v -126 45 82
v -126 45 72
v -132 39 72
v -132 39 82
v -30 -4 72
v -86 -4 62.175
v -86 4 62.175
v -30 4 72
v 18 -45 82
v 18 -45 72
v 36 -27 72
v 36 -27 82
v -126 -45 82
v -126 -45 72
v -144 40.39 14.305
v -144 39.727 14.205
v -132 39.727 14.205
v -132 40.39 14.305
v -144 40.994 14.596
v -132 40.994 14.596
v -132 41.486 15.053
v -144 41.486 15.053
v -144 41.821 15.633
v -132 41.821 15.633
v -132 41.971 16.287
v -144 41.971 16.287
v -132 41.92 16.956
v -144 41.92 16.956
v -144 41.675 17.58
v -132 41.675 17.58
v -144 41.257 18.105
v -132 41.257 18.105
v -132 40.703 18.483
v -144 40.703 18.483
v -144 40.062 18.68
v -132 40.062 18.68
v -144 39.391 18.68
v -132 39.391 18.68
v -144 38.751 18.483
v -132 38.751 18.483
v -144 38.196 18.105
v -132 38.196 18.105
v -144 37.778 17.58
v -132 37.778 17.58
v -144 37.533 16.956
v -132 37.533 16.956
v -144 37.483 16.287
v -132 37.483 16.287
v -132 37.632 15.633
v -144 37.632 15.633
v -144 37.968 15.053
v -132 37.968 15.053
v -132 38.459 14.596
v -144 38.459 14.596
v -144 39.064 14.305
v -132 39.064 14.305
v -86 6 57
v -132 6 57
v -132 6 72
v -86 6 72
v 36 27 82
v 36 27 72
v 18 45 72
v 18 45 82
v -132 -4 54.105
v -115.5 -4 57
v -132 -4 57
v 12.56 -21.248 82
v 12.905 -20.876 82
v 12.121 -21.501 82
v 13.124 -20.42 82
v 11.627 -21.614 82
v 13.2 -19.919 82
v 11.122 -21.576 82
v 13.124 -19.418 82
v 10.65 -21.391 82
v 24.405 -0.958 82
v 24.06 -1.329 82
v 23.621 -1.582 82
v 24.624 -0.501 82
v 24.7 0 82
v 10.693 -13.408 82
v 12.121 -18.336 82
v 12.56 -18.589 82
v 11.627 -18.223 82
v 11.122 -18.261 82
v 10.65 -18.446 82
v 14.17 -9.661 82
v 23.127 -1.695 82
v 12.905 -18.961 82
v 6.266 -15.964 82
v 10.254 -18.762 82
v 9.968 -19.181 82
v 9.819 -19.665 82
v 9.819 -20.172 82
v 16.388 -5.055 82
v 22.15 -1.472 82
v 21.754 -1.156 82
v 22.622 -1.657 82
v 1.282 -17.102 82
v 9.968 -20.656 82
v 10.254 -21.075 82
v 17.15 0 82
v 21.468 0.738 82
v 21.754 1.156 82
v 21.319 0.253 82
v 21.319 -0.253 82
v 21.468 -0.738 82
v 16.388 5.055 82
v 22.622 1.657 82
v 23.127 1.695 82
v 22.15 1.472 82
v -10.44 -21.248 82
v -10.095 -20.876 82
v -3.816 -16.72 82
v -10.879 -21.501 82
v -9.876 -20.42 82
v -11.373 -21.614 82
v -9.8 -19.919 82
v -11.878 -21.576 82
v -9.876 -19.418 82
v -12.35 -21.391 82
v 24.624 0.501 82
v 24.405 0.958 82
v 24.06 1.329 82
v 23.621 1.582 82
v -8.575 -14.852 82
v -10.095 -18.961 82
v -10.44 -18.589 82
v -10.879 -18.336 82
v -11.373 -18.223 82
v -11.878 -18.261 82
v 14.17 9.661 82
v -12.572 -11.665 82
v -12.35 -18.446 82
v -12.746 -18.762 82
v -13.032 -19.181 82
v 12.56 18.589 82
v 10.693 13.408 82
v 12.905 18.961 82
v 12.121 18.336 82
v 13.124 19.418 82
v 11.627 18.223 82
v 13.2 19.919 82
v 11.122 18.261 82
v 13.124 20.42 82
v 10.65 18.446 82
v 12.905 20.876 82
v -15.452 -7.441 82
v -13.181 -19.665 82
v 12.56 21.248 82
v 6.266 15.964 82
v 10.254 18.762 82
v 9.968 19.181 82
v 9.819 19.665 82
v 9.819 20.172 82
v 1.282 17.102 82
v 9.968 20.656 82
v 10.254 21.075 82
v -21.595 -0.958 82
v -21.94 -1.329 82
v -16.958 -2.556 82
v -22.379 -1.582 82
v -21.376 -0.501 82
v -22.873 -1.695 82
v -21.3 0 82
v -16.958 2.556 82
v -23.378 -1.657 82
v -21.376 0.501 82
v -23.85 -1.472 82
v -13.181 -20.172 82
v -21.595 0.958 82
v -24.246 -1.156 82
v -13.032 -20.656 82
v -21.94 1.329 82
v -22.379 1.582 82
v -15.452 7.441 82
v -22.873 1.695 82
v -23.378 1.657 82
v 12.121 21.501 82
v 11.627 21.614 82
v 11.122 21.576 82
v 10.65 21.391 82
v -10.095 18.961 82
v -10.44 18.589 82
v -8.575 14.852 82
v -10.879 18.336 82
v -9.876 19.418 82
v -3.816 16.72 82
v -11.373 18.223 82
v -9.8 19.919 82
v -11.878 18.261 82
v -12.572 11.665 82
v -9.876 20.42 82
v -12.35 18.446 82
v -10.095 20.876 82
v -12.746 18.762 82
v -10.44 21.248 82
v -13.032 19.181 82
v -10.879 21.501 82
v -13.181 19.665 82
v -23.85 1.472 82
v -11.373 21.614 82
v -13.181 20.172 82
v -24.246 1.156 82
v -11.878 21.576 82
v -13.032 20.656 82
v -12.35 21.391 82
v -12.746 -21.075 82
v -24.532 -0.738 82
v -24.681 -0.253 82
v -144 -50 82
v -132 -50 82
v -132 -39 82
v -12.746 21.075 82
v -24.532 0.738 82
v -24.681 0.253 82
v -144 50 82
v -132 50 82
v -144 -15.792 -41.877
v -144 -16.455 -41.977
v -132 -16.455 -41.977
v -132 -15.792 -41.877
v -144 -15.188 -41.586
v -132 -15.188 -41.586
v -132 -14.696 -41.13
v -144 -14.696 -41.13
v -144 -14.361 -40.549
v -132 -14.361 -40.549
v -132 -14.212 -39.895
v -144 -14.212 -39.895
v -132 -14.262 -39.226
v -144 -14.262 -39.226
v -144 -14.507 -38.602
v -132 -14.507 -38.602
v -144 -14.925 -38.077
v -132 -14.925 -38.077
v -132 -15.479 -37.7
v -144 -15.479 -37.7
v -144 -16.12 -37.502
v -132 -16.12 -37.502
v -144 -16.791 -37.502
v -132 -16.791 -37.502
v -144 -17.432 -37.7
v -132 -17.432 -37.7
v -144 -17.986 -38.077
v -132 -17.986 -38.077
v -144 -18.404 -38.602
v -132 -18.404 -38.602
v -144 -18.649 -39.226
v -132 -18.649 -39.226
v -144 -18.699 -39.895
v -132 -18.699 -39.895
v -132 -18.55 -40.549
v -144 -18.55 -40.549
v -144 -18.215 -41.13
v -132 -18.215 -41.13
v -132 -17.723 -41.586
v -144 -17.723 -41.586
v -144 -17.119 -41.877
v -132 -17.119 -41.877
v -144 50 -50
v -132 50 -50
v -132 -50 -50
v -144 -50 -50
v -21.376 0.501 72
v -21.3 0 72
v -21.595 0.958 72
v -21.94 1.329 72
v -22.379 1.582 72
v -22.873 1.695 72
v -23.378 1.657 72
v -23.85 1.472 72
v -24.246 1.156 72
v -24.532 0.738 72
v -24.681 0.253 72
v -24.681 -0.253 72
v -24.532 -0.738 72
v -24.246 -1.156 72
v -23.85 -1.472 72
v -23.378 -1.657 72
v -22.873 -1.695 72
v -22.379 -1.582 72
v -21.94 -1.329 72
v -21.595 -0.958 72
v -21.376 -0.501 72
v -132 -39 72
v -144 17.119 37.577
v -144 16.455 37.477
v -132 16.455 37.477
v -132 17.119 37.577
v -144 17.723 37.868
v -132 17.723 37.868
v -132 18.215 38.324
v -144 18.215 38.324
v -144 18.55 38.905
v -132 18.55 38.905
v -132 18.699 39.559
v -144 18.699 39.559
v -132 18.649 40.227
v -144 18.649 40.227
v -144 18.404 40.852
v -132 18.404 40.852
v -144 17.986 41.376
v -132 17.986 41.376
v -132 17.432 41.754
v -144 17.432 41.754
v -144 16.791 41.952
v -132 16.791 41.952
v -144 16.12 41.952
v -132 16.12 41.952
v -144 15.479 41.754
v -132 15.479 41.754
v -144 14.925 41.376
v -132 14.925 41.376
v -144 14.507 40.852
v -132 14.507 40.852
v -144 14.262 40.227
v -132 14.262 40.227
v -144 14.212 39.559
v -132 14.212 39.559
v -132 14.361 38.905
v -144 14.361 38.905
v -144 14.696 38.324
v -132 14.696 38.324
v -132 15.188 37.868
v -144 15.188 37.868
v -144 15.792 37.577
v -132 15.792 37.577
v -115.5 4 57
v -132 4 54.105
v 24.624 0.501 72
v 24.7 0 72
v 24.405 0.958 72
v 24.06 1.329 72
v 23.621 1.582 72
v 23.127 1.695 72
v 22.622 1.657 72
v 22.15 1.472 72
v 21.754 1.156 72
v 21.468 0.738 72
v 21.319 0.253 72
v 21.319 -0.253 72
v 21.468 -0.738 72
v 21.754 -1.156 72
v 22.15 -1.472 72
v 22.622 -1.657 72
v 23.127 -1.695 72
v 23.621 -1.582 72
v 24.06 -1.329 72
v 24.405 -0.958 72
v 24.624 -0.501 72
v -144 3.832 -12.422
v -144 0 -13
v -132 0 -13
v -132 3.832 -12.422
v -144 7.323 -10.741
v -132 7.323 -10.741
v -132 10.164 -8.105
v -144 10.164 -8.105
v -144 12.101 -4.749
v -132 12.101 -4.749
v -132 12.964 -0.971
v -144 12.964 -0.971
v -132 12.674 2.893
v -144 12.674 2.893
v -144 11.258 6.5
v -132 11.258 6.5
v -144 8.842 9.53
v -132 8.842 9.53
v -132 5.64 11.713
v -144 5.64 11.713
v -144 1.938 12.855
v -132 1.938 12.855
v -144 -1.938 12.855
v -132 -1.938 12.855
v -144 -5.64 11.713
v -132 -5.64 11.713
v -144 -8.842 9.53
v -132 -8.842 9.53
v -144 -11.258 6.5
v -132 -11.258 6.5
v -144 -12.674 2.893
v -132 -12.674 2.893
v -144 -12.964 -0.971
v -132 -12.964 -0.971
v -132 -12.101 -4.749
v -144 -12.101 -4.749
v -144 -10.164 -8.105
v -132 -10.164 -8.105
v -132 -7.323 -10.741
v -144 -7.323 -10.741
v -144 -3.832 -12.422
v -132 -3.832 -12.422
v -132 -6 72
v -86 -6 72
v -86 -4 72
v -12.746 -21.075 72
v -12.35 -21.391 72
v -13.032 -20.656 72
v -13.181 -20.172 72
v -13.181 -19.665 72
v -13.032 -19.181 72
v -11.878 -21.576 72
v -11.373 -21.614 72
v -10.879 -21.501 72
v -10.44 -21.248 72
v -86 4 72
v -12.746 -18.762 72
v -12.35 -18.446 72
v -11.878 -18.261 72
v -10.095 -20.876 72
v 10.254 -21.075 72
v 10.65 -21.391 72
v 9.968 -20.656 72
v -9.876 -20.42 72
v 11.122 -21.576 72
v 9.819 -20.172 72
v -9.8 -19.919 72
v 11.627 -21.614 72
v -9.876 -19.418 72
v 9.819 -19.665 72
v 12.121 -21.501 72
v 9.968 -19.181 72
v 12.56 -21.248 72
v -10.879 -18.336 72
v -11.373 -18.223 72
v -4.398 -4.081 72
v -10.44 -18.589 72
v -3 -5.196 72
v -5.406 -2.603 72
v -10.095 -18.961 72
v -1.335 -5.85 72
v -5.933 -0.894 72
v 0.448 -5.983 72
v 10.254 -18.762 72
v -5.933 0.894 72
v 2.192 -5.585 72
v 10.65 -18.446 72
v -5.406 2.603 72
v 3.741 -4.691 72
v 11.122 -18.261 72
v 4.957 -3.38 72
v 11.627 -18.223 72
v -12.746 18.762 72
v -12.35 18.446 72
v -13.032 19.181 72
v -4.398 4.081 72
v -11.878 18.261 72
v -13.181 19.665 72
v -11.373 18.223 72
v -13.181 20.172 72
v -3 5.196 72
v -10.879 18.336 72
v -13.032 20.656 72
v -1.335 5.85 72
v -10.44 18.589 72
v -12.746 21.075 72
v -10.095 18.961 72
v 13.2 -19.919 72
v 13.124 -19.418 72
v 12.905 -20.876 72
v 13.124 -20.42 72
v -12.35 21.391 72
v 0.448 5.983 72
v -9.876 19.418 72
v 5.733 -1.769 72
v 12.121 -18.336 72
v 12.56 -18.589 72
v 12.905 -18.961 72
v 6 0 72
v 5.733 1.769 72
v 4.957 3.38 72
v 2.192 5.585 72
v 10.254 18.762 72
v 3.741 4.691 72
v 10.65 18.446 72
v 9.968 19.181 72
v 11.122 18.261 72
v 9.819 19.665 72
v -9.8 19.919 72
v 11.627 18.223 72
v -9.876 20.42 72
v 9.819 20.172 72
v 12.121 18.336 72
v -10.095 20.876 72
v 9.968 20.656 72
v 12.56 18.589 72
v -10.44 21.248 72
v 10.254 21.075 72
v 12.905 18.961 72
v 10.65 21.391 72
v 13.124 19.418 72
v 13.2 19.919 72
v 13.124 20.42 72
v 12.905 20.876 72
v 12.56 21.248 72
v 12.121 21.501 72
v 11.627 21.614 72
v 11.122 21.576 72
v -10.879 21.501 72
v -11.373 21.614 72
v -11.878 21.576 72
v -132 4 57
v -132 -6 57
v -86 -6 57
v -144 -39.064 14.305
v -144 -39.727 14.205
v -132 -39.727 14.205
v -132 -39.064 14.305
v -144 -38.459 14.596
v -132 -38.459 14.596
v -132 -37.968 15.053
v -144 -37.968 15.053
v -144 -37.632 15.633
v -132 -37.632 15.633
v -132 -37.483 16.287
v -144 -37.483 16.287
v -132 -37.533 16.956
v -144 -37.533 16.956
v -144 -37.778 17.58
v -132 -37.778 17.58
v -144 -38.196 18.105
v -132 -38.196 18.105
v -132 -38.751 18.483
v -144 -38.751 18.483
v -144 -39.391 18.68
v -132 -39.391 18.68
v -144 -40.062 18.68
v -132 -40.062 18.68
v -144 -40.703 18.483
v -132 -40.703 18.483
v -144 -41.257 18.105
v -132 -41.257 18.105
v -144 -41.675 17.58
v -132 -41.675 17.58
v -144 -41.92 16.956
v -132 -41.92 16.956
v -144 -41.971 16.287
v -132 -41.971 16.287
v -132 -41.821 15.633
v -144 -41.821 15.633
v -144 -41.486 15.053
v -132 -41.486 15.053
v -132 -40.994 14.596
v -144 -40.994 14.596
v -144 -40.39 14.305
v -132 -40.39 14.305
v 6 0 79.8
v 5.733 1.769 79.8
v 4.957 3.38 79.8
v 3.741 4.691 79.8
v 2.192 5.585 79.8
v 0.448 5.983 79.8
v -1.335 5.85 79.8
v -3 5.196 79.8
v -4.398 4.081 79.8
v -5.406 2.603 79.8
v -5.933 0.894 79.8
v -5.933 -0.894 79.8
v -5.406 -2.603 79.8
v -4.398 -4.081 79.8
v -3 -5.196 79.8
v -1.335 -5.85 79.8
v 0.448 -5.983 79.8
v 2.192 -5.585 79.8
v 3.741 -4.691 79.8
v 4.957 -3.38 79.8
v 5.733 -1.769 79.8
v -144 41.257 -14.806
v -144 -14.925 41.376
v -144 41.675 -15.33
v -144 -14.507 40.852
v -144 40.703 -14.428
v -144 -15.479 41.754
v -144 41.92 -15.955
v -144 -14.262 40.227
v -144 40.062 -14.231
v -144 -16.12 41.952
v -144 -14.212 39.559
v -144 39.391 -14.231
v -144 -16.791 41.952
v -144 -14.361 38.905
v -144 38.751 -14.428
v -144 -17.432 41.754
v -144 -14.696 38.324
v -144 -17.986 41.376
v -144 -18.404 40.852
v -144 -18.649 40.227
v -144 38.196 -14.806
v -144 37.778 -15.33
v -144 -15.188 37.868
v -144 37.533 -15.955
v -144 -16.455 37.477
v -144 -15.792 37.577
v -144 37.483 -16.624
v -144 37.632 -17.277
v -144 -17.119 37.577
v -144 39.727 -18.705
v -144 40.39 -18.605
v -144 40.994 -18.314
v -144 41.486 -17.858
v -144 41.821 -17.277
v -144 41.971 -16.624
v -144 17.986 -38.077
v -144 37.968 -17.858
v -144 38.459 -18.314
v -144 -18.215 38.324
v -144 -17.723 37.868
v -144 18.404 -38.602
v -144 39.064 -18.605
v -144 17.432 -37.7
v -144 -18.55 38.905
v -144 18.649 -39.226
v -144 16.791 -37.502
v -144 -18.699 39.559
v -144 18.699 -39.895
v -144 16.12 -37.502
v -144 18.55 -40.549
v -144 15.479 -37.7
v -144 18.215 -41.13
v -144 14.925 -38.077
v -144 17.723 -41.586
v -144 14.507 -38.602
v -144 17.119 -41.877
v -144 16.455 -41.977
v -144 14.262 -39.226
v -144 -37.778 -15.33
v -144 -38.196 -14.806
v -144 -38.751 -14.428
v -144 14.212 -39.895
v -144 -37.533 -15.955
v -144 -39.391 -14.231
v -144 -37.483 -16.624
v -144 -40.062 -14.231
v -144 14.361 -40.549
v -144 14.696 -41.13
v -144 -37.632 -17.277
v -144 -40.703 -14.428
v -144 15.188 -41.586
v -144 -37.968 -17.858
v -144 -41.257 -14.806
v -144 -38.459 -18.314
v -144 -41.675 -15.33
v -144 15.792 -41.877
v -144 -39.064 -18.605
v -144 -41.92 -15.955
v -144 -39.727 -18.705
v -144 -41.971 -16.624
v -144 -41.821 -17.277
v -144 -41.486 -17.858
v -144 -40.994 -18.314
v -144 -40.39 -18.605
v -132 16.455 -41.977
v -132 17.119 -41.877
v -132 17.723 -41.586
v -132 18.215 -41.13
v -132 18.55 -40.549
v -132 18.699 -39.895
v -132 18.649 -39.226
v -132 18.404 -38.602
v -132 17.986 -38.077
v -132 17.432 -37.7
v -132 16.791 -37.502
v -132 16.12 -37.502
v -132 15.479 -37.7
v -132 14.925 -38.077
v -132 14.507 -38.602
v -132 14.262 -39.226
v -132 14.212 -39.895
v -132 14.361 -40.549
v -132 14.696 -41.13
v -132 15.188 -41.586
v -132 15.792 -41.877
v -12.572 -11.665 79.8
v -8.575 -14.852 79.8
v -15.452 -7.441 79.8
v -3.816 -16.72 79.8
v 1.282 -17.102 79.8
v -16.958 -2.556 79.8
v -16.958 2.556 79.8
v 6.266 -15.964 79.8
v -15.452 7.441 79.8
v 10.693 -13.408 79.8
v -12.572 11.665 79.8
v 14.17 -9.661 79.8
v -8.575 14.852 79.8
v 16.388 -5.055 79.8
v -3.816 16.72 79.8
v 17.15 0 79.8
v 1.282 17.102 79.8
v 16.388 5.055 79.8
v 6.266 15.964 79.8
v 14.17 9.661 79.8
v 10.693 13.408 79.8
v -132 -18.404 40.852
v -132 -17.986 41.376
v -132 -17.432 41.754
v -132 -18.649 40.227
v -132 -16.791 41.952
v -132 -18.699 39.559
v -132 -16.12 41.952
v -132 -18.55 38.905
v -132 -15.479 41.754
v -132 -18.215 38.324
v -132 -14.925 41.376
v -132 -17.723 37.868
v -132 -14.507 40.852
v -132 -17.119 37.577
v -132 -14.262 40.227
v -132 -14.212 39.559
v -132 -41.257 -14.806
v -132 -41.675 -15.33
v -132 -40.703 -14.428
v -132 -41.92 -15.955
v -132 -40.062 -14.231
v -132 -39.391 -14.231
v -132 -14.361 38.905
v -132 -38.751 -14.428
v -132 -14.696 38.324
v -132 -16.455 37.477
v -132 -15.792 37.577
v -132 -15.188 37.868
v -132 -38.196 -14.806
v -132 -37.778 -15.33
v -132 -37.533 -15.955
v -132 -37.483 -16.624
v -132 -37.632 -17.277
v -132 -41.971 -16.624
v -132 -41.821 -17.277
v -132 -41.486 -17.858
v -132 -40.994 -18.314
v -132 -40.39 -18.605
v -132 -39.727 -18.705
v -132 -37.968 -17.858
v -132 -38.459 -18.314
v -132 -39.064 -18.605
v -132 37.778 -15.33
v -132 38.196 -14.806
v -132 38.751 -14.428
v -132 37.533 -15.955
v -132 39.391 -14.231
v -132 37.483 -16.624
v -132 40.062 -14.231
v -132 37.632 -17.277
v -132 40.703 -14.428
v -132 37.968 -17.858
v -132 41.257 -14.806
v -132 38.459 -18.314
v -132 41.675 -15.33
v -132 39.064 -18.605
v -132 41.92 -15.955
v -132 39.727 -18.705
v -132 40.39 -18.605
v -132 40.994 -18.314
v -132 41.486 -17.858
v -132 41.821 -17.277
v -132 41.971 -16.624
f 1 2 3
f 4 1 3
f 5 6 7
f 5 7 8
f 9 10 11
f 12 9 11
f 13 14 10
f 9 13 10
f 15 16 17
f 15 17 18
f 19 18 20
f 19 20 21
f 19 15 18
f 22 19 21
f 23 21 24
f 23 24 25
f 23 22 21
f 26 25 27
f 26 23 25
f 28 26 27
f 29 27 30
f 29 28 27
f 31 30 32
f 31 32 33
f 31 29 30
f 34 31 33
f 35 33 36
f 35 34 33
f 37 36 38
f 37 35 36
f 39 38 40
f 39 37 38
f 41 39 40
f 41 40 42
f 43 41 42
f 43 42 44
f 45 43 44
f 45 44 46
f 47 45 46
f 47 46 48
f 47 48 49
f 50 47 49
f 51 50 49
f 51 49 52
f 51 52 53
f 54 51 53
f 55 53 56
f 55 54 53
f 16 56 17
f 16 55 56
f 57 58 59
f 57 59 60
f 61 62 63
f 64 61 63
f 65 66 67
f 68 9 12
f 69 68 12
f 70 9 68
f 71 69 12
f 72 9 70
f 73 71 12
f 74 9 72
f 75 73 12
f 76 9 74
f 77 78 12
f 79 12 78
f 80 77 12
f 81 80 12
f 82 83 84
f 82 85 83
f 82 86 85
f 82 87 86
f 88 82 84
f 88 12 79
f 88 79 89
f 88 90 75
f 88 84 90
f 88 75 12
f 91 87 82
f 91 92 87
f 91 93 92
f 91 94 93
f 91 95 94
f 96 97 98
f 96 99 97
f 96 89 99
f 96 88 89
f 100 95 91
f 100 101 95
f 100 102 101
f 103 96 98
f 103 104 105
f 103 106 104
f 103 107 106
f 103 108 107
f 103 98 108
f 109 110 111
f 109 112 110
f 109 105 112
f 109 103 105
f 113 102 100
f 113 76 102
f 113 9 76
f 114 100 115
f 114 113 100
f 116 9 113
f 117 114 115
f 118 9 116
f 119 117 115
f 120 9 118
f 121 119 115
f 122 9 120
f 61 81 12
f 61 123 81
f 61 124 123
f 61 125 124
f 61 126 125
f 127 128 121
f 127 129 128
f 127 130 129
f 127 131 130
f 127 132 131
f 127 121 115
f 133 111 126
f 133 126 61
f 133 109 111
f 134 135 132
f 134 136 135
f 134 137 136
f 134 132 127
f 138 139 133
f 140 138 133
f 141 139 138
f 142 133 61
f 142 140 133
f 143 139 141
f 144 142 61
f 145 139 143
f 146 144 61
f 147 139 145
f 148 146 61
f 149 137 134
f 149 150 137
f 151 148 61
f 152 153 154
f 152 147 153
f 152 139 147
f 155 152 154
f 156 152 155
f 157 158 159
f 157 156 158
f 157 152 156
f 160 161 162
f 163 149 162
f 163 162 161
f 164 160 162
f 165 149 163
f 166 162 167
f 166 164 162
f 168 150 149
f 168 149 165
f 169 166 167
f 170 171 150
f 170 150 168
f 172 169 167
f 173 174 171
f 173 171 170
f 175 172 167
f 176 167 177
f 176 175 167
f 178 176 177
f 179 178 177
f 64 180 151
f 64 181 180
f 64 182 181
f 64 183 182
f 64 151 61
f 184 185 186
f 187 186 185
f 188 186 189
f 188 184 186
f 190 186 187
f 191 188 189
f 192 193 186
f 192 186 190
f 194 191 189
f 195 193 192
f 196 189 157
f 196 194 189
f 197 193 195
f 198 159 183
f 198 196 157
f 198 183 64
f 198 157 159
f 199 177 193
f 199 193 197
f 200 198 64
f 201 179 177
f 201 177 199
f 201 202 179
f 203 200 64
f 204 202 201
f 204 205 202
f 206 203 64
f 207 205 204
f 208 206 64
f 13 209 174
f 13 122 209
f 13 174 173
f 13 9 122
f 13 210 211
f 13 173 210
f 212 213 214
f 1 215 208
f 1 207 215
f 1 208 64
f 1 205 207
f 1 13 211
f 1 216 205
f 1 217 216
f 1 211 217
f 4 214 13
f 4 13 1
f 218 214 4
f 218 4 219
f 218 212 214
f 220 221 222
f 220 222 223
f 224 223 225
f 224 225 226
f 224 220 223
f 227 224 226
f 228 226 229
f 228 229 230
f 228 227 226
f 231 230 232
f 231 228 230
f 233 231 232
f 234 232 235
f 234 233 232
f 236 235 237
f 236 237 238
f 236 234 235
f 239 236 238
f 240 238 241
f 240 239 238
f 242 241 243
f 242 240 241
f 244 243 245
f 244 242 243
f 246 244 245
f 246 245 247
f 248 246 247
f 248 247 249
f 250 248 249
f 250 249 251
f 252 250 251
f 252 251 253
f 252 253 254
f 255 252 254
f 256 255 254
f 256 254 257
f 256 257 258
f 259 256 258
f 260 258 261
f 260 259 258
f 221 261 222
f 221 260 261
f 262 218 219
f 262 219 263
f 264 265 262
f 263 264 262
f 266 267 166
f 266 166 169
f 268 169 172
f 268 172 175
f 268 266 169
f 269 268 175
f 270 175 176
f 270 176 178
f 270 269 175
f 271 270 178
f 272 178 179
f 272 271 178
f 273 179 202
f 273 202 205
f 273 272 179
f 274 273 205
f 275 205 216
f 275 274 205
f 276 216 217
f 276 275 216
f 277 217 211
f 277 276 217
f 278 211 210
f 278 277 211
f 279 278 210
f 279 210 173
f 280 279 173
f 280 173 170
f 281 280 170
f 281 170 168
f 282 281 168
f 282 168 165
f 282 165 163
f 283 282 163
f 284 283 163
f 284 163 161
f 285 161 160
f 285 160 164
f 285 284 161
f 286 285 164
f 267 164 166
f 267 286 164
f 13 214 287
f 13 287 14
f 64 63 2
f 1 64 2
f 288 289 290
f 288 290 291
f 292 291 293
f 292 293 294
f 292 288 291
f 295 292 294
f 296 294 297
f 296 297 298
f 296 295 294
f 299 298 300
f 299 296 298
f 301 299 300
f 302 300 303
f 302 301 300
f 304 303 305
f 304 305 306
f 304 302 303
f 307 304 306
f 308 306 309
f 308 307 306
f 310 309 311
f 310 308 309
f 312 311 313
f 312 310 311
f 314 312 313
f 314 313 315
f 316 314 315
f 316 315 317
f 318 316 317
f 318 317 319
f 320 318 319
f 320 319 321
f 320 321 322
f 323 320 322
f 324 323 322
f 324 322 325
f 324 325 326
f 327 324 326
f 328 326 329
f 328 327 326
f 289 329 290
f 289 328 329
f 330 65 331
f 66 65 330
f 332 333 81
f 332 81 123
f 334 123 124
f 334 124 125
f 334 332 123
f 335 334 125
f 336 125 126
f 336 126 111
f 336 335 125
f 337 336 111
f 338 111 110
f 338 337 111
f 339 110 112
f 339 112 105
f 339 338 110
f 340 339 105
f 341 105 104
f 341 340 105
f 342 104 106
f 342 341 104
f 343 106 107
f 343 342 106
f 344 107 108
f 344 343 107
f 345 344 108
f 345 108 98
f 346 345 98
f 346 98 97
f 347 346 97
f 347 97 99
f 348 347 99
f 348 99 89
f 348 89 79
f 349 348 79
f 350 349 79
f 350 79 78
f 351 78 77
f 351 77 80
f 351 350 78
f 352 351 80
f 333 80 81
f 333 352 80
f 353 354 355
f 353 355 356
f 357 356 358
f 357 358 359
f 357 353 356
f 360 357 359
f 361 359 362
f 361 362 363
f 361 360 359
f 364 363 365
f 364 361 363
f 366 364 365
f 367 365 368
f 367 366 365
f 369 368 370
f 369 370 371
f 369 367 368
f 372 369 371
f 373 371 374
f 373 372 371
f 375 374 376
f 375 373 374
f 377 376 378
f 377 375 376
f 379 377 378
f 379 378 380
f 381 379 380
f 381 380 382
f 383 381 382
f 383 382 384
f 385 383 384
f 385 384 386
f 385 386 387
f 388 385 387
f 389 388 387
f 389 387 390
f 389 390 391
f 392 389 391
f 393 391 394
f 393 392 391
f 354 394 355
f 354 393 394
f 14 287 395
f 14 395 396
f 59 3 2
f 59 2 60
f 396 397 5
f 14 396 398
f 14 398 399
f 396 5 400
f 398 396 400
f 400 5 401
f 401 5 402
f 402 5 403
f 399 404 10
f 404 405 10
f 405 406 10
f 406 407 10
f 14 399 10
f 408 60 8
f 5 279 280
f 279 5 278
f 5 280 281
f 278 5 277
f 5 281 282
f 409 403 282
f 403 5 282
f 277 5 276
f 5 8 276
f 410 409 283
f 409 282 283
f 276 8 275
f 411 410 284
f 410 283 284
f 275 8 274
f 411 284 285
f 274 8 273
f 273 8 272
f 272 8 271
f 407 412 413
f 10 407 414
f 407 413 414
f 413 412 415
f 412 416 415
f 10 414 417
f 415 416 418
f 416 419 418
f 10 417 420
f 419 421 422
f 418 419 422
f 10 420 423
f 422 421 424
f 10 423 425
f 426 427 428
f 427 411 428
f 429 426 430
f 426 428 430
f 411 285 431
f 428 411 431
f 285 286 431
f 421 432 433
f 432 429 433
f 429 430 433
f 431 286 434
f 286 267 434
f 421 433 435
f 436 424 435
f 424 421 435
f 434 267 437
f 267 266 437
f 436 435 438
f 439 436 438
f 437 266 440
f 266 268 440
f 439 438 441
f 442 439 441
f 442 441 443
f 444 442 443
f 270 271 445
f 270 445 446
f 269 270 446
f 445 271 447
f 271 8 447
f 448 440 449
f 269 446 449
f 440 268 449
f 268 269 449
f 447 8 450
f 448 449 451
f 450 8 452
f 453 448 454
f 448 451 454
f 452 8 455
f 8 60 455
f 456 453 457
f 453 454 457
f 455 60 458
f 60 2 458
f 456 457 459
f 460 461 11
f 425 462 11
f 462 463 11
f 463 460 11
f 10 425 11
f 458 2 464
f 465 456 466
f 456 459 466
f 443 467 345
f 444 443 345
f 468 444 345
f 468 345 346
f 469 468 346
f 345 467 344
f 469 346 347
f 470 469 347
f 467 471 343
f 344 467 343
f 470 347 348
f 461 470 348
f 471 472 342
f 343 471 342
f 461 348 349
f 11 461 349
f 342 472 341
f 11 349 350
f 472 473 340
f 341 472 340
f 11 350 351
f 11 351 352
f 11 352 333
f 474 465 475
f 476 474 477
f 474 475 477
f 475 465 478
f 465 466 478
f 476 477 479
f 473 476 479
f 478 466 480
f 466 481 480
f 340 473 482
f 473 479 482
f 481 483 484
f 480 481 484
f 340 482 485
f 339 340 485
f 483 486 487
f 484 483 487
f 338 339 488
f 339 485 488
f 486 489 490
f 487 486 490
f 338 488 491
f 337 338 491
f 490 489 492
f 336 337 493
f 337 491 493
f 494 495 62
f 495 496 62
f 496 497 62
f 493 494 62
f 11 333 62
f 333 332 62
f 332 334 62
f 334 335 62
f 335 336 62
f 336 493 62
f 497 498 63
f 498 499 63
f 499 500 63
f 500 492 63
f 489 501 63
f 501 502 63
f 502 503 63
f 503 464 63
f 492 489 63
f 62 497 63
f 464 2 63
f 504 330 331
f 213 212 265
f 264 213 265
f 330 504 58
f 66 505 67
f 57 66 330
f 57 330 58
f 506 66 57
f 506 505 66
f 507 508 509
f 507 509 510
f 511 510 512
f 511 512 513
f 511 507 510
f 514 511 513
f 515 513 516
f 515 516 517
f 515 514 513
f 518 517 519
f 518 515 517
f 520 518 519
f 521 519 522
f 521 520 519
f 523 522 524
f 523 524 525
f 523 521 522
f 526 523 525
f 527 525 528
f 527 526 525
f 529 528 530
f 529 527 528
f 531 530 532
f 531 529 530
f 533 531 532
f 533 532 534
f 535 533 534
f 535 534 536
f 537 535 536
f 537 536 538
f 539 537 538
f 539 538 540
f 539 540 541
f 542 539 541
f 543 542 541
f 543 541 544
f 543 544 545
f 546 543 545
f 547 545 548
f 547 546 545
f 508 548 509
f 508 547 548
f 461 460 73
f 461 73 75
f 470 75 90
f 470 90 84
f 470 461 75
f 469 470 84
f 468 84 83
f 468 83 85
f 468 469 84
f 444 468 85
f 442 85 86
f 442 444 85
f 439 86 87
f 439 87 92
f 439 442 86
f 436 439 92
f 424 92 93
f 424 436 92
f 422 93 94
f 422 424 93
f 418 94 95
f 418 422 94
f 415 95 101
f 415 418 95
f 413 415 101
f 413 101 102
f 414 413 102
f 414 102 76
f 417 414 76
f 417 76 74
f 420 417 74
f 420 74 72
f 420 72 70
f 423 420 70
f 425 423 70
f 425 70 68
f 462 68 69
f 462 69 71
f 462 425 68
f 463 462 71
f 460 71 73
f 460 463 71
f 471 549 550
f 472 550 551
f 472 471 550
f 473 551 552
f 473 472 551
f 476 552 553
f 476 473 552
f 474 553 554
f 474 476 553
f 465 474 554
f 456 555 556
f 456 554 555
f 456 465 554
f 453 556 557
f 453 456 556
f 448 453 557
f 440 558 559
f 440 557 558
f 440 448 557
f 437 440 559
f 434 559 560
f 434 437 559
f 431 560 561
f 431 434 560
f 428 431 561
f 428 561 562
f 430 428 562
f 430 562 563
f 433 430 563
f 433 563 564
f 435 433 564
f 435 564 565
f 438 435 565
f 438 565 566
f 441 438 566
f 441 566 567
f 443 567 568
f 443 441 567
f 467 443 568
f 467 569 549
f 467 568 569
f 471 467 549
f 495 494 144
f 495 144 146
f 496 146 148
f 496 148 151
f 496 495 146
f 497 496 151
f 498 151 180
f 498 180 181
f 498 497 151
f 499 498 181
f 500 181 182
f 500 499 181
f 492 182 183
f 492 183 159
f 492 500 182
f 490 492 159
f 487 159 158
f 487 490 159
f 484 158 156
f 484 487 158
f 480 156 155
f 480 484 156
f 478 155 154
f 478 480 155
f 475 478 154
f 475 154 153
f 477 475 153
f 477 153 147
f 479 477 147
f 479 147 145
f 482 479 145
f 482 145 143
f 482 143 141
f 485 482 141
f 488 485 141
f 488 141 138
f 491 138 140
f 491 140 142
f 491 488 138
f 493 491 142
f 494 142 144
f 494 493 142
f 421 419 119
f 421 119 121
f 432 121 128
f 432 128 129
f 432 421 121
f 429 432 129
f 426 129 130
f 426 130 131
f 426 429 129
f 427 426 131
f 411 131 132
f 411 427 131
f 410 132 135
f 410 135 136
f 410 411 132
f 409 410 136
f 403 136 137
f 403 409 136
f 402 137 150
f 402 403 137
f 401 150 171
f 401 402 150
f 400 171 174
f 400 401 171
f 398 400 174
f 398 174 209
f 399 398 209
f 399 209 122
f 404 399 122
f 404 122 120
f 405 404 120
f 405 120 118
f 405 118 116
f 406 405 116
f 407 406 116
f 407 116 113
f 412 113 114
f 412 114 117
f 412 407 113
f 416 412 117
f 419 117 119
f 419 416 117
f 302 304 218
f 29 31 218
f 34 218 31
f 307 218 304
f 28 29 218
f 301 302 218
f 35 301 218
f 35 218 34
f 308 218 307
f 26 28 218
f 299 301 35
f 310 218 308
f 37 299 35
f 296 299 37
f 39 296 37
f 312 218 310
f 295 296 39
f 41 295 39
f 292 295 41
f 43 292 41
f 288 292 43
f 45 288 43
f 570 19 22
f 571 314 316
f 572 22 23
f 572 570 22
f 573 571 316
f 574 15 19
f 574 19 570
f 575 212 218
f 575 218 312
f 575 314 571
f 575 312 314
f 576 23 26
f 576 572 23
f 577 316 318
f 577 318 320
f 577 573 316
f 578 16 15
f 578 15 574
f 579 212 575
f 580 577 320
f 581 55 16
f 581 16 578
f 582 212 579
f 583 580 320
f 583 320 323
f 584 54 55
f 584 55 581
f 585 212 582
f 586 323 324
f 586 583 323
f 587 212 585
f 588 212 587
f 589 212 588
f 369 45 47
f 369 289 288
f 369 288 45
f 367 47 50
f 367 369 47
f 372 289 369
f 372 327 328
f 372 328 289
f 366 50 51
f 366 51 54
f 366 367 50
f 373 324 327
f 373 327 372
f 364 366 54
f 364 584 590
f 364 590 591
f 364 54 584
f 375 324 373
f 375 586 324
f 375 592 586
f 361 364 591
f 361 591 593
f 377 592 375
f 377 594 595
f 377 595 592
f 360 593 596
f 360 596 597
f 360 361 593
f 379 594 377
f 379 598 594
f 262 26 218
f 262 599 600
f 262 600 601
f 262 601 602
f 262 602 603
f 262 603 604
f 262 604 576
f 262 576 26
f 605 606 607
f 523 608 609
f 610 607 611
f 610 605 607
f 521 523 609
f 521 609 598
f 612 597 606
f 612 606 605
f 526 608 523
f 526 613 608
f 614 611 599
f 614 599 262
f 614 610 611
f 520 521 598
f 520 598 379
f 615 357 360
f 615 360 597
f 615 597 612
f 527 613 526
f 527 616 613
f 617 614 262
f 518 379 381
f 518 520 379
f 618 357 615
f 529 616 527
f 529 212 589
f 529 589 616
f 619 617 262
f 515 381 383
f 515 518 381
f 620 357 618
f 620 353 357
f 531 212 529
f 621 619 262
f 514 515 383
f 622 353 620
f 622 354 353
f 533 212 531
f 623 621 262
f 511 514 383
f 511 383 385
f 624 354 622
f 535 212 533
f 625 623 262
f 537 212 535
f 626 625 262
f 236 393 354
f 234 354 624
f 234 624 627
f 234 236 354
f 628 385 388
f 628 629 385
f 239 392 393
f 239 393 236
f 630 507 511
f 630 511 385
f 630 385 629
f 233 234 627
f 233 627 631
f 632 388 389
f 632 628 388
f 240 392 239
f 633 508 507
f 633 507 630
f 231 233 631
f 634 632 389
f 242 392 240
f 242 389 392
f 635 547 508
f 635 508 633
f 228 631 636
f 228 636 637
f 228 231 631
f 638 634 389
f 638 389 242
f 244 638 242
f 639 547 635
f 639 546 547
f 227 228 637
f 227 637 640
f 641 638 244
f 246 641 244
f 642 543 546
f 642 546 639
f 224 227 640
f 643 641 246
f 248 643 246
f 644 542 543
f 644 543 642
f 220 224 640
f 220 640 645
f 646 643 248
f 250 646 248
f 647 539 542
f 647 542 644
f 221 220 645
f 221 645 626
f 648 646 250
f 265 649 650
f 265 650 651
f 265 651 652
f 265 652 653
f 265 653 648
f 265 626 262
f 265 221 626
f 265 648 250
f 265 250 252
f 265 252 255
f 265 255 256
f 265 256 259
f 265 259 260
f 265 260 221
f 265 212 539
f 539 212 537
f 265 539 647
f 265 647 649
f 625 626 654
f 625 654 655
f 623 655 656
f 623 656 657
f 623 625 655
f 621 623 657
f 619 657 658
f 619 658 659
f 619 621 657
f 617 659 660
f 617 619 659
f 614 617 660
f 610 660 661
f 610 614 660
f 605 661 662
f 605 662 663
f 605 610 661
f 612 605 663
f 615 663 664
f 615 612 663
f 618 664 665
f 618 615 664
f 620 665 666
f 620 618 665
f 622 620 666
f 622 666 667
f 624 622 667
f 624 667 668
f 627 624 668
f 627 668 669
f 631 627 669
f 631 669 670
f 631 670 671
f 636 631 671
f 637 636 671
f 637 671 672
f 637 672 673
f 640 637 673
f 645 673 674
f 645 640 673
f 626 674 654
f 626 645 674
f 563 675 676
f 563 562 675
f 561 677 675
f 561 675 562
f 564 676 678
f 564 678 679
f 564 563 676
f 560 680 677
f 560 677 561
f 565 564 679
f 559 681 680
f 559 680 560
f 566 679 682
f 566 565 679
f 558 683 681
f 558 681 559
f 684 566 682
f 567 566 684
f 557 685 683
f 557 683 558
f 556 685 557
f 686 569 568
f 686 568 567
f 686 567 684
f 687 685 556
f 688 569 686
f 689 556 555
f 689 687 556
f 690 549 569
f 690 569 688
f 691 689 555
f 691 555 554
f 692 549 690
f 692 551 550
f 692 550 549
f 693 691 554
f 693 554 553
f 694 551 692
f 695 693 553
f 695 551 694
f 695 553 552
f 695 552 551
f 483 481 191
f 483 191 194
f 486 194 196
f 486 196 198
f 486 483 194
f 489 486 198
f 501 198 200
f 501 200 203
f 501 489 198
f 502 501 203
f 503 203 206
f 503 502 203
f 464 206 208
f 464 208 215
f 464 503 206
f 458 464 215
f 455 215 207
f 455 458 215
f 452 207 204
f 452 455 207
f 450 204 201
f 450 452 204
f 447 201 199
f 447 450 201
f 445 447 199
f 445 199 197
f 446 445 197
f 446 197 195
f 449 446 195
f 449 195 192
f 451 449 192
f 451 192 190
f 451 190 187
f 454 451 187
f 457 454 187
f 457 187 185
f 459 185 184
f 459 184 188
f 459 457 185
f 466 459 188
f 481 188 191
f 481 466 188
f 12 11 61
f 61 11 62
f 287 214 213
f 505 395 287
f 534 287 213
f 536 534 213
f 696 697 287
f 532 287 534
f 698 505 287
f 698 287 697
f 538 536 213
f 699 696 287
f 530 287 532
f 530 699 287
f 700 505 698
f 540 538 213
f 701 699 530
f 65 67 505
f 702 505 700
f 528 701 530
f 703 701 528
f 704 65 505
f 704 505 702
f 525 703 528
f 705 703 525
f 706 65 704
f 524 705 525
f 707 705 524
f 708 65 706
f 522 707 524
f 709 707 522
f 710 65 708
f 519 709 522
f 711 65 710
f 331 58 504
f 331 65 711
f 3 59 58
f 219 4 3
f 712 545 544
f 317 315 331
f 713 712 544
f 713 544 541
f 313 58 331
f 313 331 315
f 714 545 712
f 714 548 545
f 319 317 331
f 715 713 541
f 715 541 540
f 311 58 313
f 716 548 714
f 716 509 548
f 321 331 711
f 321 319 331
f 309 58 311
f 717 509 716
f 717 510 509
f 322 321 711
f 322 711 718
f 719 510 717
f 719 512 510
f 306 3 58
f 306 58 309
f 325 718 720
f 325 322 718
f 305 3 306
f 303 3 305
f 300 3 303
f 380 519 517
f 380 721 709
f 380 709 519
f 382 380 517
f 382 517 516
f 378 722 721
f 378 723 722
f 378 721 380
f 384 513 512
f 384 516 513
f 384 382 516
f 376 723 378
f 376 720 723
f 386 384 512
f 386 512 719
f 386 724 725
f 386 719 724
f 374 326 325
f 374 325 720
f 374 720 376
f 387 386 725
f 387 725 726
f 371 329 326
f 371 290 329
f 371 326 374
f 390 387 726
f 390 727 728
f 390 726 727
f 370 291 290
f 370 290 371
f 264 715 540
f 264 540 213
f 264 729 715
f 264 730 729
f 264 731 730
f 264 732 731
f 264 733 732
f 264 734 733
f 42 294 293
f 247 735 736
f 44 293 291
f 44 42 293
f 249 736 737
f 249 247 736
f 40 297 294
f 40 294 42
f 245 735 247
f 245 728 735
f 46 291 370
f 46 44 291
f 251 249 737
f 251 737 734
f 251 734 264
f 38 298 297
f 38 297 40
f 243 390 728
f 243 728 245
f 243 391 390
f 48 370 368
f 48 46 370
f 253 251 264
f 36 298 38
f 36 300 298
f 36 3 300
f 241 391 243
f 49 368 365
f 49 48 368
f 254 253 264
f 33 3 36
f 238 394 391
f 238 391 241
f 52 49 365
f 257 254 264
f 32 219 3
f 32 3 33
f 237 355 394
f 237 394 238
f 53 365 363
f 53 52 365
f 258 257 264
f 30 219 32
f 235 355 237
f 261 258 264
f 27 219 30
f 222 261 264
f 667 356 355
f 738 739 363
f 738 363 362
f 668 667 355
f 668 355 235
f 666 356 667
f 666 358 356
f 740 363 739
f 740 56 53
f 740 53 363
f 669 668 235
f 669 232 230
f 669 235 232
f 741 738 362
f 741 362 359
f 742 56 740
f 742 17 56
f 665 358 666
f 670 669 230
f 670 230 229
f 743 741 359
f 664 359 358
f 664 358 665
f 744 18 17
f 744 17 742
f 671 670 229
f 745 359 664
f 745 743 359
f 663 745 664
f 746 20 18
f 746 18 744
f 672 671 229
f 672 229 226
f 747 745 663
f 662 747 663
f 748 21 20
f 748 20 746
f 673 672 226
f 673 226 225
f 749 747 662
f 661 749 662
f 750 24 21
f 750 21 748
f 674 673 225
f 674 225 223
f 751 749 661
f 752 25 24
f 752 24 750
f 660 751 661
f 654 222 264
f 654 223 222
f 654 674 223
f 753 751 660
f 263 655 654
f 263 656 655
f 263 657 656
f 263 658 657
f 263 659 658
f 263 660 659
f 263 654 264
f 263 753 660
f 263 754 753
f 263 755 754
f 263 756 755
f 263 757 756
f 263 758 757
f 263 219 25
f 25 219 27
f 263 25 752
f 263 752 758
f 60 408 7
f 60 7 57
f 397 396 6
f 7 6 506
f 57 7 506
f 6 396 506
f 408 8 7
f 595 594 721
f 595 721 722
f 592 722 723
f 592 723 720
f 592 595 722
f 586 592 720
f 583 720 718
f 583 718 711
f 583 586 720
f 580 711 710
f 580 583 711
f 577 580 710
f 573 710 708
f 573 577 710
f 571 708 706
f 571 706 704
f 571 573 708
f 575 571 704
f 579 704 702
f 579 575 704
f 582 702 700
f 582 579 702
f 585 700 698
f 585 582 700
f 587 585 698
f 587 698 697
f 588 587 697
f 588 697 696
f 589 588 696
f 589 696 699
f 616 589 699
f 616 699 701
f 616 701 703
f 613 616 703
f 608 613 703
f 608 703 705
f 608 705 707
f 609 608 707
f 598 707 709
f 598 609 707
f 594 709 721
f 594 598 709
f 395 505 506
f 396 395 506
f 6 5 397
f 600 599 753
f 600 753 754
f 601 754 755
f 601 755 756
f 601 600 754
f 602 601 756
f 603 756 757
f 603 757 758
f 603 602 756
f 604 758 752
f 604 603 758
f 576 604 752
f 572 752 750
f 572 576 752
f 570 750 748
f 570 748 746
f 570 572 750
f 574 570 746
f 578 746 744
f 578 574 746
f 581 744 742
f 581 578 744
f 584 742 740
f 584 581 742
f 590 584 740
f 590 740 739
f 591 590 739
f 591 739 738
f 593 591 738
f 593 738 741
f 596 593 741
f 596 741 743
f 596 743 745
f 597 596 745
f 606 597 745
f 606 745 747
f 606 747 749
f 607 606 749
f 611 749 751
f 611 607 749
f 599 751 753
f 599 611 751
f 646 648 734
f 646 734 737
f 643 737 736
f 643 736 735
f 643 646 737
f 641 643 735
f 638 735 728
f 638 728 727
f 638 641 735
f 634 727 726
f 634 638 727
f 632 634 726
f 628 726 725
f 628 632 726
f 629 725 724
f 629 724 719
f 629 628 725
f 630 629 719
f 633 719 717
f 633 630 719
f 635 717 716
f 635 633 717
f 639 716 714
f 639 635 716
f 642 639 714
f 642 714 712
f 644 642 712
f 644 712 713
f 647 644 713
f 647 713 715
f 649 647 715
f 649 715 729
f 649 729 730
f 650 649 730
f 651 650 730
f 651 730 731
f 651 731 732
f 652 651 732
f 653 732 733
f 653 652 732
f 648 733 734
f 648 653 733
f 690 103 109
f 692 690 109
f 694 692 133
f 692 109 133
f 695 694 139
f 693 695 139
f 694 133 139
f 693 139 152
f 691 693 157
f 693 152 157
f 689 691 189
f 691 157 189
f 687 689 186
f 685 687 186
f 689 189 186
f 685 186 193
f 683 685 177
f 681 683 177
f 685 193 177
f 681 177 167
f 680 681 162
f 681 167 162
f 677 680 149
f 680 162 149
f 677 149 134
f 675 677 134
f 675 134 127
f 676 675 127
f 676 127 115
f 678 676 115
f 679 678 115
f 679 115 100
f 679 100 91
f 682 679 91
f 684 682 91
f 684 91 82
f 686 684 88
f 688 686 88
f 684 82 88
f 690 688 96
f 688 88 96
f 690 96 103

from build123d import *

# Parameters (mm, degrees)
SK_TOP_PLATE_R         = 1.7
SK_TOP_PLATE_R_2       = 6
TOP_PLATE_DEPTH        = 10
SK_YAW_PILOT_RECESS_R  = 17.15
YAW_PILOT_RECESS_DEPTH = 2.2
SK_BACK_PLATE_W        = 132
SK_BACK_PLATE_H        = 100
SK_BACK_PLATE_R        = 2.25
SK_BACK_PLATE_R_2      = 13
BACK_PLATE_DEPTH       = 12
RIB_DEPTH              = 8
SK_KEEL_W              = 58
SK_KEEL_H              = 15
KEEL_DEPTH             = 12


with BuildPart() as part:
    # SK_Top_Plate → Top_Plate (new body)
    with BuildSketch(Plane.XY.offset(72)):
        Polygon((-126, -45), (18, -45), (36, -27), (36, 27), (18, 45), (-126, 45), (-144, 27), (-144, -27), align=None)
        with Locations((23, 0)):
            Circle(SK_TOP_PLATE_R, mode=Mode.SUBTRACT)
        with Locations((11.5, 19.918584287)):
            Circle(SK_TOP_PLATE_R, mode=Mode.SUBTRACT)
        with Locations((-11.5, 19.918584287)):
            Circle(SK_TOP_PLATE_R, mode=Mode.SUBTRACT)
        with Locations((-23, 0)):
            Circle(SK_TOP_PLATE_R, mode=Mode.SUBTRACT)
        with Locations((-11.5, -19.918584287)):
            Circle(SK_TOP_PLATE_R, mode=Mode.SUBTRACT)
        with Locations((11.5, -19.918584287)):
            Circle(SK_TOP_PLATE_R, mode=Mode.SUBTRACT)
        Circle(SK_TOP_PLATE_R_2, mode=Mode.SUBTRACT)
    extrude(amount=TOP_PLATE_DEPTH)

    # SK_Yaw_Pilot_Recess → Yaw_Pilot_Recess (cut)
    with BuildSketch(Plane.XY.offset(82)):
        Circle(SK_YAW_PILOT_RECESS_R)
    extrude(amount=-YAW_PILOT_RECESS_DEPTH, mode=Mode.SUBTRACT)

    # SK_Back_Plate → Back_Plate (add)
    with BuildSketch(Plane(origin=(-144, 0, 0), x_dir=(0, 0, -1), z_dir=(1, 0, 0))):
        with Locations((-16, 0)):
            Rectangle(SK_BACK_PLATE_W, SK_BACK_PLATE_H)
        with Locations((39.726819898, 16.455387592)):
            Circle(SK_BACK_PLATE_R, mode=Mode.SUBTRACT)
        with Locations((16.455387592, 39.726819898)):
            Circle(SK_BACK_PLATE_R, mode=Mode.SUBTRACT)
        with Locations((-16.455387592, 39.726819898)):
            Circle(SK_BACK_PLATE_R, mode=Mode.SUBTRACT)
        with Locations((-39.726819898, 16.455387592)):
            Circle(SK_BACK_PLATE_R, mode=Mode.SUBTRACT)
        with Locations((-39.726819898, -16.455387592)):
            Circle(SK_BACK_PLATE_R, mode=Mode.SUBTRACT)
        with Locations((-16.455387592, -39.726819898)):
            Circle(SK_BACK_PLATE_R, mode=Mode.SUBTRACT)
        with Locations((16.455387592, -39.726819898)):
            Circle(SK_BACK_PLATE_R, mode=Mode.SUBTRACT)
        with Locations((39.726819898, -16.455387592)):
            Circle(SK_BACK_PLATE_R, mode=Mode.SUBTRACT)
        Circle(SK_BACK_PLATE_R_2, mode=Mode.SUBTRACT)
    extrude(amount=BACK_PLATE_DEPTH)

    # SK_Rib → Rib (add)
    with BuildSketch(Plane(origin=(0, -4, 0), x_dir=(1, 0, 0), z_dir=(0, 1, 0))):
        Polygon((-144, -52), (-30, -72), (-144, -72), align=None)
    extrude(amount=RIB_DEPTH)

    # SK_Keel → Keel (add)
    with BuildSketch(Plane(origin=(0, -6, 0), x_dir=(1, 0, 0), z_dir=(0, 1, 0))):
        with Locations((-115, -64.5)):
            Rectangle(SK_KEEL_W, SK_KEEL_H)
    extrude(amount=KEEL_DEPTH)


solid = part.part
